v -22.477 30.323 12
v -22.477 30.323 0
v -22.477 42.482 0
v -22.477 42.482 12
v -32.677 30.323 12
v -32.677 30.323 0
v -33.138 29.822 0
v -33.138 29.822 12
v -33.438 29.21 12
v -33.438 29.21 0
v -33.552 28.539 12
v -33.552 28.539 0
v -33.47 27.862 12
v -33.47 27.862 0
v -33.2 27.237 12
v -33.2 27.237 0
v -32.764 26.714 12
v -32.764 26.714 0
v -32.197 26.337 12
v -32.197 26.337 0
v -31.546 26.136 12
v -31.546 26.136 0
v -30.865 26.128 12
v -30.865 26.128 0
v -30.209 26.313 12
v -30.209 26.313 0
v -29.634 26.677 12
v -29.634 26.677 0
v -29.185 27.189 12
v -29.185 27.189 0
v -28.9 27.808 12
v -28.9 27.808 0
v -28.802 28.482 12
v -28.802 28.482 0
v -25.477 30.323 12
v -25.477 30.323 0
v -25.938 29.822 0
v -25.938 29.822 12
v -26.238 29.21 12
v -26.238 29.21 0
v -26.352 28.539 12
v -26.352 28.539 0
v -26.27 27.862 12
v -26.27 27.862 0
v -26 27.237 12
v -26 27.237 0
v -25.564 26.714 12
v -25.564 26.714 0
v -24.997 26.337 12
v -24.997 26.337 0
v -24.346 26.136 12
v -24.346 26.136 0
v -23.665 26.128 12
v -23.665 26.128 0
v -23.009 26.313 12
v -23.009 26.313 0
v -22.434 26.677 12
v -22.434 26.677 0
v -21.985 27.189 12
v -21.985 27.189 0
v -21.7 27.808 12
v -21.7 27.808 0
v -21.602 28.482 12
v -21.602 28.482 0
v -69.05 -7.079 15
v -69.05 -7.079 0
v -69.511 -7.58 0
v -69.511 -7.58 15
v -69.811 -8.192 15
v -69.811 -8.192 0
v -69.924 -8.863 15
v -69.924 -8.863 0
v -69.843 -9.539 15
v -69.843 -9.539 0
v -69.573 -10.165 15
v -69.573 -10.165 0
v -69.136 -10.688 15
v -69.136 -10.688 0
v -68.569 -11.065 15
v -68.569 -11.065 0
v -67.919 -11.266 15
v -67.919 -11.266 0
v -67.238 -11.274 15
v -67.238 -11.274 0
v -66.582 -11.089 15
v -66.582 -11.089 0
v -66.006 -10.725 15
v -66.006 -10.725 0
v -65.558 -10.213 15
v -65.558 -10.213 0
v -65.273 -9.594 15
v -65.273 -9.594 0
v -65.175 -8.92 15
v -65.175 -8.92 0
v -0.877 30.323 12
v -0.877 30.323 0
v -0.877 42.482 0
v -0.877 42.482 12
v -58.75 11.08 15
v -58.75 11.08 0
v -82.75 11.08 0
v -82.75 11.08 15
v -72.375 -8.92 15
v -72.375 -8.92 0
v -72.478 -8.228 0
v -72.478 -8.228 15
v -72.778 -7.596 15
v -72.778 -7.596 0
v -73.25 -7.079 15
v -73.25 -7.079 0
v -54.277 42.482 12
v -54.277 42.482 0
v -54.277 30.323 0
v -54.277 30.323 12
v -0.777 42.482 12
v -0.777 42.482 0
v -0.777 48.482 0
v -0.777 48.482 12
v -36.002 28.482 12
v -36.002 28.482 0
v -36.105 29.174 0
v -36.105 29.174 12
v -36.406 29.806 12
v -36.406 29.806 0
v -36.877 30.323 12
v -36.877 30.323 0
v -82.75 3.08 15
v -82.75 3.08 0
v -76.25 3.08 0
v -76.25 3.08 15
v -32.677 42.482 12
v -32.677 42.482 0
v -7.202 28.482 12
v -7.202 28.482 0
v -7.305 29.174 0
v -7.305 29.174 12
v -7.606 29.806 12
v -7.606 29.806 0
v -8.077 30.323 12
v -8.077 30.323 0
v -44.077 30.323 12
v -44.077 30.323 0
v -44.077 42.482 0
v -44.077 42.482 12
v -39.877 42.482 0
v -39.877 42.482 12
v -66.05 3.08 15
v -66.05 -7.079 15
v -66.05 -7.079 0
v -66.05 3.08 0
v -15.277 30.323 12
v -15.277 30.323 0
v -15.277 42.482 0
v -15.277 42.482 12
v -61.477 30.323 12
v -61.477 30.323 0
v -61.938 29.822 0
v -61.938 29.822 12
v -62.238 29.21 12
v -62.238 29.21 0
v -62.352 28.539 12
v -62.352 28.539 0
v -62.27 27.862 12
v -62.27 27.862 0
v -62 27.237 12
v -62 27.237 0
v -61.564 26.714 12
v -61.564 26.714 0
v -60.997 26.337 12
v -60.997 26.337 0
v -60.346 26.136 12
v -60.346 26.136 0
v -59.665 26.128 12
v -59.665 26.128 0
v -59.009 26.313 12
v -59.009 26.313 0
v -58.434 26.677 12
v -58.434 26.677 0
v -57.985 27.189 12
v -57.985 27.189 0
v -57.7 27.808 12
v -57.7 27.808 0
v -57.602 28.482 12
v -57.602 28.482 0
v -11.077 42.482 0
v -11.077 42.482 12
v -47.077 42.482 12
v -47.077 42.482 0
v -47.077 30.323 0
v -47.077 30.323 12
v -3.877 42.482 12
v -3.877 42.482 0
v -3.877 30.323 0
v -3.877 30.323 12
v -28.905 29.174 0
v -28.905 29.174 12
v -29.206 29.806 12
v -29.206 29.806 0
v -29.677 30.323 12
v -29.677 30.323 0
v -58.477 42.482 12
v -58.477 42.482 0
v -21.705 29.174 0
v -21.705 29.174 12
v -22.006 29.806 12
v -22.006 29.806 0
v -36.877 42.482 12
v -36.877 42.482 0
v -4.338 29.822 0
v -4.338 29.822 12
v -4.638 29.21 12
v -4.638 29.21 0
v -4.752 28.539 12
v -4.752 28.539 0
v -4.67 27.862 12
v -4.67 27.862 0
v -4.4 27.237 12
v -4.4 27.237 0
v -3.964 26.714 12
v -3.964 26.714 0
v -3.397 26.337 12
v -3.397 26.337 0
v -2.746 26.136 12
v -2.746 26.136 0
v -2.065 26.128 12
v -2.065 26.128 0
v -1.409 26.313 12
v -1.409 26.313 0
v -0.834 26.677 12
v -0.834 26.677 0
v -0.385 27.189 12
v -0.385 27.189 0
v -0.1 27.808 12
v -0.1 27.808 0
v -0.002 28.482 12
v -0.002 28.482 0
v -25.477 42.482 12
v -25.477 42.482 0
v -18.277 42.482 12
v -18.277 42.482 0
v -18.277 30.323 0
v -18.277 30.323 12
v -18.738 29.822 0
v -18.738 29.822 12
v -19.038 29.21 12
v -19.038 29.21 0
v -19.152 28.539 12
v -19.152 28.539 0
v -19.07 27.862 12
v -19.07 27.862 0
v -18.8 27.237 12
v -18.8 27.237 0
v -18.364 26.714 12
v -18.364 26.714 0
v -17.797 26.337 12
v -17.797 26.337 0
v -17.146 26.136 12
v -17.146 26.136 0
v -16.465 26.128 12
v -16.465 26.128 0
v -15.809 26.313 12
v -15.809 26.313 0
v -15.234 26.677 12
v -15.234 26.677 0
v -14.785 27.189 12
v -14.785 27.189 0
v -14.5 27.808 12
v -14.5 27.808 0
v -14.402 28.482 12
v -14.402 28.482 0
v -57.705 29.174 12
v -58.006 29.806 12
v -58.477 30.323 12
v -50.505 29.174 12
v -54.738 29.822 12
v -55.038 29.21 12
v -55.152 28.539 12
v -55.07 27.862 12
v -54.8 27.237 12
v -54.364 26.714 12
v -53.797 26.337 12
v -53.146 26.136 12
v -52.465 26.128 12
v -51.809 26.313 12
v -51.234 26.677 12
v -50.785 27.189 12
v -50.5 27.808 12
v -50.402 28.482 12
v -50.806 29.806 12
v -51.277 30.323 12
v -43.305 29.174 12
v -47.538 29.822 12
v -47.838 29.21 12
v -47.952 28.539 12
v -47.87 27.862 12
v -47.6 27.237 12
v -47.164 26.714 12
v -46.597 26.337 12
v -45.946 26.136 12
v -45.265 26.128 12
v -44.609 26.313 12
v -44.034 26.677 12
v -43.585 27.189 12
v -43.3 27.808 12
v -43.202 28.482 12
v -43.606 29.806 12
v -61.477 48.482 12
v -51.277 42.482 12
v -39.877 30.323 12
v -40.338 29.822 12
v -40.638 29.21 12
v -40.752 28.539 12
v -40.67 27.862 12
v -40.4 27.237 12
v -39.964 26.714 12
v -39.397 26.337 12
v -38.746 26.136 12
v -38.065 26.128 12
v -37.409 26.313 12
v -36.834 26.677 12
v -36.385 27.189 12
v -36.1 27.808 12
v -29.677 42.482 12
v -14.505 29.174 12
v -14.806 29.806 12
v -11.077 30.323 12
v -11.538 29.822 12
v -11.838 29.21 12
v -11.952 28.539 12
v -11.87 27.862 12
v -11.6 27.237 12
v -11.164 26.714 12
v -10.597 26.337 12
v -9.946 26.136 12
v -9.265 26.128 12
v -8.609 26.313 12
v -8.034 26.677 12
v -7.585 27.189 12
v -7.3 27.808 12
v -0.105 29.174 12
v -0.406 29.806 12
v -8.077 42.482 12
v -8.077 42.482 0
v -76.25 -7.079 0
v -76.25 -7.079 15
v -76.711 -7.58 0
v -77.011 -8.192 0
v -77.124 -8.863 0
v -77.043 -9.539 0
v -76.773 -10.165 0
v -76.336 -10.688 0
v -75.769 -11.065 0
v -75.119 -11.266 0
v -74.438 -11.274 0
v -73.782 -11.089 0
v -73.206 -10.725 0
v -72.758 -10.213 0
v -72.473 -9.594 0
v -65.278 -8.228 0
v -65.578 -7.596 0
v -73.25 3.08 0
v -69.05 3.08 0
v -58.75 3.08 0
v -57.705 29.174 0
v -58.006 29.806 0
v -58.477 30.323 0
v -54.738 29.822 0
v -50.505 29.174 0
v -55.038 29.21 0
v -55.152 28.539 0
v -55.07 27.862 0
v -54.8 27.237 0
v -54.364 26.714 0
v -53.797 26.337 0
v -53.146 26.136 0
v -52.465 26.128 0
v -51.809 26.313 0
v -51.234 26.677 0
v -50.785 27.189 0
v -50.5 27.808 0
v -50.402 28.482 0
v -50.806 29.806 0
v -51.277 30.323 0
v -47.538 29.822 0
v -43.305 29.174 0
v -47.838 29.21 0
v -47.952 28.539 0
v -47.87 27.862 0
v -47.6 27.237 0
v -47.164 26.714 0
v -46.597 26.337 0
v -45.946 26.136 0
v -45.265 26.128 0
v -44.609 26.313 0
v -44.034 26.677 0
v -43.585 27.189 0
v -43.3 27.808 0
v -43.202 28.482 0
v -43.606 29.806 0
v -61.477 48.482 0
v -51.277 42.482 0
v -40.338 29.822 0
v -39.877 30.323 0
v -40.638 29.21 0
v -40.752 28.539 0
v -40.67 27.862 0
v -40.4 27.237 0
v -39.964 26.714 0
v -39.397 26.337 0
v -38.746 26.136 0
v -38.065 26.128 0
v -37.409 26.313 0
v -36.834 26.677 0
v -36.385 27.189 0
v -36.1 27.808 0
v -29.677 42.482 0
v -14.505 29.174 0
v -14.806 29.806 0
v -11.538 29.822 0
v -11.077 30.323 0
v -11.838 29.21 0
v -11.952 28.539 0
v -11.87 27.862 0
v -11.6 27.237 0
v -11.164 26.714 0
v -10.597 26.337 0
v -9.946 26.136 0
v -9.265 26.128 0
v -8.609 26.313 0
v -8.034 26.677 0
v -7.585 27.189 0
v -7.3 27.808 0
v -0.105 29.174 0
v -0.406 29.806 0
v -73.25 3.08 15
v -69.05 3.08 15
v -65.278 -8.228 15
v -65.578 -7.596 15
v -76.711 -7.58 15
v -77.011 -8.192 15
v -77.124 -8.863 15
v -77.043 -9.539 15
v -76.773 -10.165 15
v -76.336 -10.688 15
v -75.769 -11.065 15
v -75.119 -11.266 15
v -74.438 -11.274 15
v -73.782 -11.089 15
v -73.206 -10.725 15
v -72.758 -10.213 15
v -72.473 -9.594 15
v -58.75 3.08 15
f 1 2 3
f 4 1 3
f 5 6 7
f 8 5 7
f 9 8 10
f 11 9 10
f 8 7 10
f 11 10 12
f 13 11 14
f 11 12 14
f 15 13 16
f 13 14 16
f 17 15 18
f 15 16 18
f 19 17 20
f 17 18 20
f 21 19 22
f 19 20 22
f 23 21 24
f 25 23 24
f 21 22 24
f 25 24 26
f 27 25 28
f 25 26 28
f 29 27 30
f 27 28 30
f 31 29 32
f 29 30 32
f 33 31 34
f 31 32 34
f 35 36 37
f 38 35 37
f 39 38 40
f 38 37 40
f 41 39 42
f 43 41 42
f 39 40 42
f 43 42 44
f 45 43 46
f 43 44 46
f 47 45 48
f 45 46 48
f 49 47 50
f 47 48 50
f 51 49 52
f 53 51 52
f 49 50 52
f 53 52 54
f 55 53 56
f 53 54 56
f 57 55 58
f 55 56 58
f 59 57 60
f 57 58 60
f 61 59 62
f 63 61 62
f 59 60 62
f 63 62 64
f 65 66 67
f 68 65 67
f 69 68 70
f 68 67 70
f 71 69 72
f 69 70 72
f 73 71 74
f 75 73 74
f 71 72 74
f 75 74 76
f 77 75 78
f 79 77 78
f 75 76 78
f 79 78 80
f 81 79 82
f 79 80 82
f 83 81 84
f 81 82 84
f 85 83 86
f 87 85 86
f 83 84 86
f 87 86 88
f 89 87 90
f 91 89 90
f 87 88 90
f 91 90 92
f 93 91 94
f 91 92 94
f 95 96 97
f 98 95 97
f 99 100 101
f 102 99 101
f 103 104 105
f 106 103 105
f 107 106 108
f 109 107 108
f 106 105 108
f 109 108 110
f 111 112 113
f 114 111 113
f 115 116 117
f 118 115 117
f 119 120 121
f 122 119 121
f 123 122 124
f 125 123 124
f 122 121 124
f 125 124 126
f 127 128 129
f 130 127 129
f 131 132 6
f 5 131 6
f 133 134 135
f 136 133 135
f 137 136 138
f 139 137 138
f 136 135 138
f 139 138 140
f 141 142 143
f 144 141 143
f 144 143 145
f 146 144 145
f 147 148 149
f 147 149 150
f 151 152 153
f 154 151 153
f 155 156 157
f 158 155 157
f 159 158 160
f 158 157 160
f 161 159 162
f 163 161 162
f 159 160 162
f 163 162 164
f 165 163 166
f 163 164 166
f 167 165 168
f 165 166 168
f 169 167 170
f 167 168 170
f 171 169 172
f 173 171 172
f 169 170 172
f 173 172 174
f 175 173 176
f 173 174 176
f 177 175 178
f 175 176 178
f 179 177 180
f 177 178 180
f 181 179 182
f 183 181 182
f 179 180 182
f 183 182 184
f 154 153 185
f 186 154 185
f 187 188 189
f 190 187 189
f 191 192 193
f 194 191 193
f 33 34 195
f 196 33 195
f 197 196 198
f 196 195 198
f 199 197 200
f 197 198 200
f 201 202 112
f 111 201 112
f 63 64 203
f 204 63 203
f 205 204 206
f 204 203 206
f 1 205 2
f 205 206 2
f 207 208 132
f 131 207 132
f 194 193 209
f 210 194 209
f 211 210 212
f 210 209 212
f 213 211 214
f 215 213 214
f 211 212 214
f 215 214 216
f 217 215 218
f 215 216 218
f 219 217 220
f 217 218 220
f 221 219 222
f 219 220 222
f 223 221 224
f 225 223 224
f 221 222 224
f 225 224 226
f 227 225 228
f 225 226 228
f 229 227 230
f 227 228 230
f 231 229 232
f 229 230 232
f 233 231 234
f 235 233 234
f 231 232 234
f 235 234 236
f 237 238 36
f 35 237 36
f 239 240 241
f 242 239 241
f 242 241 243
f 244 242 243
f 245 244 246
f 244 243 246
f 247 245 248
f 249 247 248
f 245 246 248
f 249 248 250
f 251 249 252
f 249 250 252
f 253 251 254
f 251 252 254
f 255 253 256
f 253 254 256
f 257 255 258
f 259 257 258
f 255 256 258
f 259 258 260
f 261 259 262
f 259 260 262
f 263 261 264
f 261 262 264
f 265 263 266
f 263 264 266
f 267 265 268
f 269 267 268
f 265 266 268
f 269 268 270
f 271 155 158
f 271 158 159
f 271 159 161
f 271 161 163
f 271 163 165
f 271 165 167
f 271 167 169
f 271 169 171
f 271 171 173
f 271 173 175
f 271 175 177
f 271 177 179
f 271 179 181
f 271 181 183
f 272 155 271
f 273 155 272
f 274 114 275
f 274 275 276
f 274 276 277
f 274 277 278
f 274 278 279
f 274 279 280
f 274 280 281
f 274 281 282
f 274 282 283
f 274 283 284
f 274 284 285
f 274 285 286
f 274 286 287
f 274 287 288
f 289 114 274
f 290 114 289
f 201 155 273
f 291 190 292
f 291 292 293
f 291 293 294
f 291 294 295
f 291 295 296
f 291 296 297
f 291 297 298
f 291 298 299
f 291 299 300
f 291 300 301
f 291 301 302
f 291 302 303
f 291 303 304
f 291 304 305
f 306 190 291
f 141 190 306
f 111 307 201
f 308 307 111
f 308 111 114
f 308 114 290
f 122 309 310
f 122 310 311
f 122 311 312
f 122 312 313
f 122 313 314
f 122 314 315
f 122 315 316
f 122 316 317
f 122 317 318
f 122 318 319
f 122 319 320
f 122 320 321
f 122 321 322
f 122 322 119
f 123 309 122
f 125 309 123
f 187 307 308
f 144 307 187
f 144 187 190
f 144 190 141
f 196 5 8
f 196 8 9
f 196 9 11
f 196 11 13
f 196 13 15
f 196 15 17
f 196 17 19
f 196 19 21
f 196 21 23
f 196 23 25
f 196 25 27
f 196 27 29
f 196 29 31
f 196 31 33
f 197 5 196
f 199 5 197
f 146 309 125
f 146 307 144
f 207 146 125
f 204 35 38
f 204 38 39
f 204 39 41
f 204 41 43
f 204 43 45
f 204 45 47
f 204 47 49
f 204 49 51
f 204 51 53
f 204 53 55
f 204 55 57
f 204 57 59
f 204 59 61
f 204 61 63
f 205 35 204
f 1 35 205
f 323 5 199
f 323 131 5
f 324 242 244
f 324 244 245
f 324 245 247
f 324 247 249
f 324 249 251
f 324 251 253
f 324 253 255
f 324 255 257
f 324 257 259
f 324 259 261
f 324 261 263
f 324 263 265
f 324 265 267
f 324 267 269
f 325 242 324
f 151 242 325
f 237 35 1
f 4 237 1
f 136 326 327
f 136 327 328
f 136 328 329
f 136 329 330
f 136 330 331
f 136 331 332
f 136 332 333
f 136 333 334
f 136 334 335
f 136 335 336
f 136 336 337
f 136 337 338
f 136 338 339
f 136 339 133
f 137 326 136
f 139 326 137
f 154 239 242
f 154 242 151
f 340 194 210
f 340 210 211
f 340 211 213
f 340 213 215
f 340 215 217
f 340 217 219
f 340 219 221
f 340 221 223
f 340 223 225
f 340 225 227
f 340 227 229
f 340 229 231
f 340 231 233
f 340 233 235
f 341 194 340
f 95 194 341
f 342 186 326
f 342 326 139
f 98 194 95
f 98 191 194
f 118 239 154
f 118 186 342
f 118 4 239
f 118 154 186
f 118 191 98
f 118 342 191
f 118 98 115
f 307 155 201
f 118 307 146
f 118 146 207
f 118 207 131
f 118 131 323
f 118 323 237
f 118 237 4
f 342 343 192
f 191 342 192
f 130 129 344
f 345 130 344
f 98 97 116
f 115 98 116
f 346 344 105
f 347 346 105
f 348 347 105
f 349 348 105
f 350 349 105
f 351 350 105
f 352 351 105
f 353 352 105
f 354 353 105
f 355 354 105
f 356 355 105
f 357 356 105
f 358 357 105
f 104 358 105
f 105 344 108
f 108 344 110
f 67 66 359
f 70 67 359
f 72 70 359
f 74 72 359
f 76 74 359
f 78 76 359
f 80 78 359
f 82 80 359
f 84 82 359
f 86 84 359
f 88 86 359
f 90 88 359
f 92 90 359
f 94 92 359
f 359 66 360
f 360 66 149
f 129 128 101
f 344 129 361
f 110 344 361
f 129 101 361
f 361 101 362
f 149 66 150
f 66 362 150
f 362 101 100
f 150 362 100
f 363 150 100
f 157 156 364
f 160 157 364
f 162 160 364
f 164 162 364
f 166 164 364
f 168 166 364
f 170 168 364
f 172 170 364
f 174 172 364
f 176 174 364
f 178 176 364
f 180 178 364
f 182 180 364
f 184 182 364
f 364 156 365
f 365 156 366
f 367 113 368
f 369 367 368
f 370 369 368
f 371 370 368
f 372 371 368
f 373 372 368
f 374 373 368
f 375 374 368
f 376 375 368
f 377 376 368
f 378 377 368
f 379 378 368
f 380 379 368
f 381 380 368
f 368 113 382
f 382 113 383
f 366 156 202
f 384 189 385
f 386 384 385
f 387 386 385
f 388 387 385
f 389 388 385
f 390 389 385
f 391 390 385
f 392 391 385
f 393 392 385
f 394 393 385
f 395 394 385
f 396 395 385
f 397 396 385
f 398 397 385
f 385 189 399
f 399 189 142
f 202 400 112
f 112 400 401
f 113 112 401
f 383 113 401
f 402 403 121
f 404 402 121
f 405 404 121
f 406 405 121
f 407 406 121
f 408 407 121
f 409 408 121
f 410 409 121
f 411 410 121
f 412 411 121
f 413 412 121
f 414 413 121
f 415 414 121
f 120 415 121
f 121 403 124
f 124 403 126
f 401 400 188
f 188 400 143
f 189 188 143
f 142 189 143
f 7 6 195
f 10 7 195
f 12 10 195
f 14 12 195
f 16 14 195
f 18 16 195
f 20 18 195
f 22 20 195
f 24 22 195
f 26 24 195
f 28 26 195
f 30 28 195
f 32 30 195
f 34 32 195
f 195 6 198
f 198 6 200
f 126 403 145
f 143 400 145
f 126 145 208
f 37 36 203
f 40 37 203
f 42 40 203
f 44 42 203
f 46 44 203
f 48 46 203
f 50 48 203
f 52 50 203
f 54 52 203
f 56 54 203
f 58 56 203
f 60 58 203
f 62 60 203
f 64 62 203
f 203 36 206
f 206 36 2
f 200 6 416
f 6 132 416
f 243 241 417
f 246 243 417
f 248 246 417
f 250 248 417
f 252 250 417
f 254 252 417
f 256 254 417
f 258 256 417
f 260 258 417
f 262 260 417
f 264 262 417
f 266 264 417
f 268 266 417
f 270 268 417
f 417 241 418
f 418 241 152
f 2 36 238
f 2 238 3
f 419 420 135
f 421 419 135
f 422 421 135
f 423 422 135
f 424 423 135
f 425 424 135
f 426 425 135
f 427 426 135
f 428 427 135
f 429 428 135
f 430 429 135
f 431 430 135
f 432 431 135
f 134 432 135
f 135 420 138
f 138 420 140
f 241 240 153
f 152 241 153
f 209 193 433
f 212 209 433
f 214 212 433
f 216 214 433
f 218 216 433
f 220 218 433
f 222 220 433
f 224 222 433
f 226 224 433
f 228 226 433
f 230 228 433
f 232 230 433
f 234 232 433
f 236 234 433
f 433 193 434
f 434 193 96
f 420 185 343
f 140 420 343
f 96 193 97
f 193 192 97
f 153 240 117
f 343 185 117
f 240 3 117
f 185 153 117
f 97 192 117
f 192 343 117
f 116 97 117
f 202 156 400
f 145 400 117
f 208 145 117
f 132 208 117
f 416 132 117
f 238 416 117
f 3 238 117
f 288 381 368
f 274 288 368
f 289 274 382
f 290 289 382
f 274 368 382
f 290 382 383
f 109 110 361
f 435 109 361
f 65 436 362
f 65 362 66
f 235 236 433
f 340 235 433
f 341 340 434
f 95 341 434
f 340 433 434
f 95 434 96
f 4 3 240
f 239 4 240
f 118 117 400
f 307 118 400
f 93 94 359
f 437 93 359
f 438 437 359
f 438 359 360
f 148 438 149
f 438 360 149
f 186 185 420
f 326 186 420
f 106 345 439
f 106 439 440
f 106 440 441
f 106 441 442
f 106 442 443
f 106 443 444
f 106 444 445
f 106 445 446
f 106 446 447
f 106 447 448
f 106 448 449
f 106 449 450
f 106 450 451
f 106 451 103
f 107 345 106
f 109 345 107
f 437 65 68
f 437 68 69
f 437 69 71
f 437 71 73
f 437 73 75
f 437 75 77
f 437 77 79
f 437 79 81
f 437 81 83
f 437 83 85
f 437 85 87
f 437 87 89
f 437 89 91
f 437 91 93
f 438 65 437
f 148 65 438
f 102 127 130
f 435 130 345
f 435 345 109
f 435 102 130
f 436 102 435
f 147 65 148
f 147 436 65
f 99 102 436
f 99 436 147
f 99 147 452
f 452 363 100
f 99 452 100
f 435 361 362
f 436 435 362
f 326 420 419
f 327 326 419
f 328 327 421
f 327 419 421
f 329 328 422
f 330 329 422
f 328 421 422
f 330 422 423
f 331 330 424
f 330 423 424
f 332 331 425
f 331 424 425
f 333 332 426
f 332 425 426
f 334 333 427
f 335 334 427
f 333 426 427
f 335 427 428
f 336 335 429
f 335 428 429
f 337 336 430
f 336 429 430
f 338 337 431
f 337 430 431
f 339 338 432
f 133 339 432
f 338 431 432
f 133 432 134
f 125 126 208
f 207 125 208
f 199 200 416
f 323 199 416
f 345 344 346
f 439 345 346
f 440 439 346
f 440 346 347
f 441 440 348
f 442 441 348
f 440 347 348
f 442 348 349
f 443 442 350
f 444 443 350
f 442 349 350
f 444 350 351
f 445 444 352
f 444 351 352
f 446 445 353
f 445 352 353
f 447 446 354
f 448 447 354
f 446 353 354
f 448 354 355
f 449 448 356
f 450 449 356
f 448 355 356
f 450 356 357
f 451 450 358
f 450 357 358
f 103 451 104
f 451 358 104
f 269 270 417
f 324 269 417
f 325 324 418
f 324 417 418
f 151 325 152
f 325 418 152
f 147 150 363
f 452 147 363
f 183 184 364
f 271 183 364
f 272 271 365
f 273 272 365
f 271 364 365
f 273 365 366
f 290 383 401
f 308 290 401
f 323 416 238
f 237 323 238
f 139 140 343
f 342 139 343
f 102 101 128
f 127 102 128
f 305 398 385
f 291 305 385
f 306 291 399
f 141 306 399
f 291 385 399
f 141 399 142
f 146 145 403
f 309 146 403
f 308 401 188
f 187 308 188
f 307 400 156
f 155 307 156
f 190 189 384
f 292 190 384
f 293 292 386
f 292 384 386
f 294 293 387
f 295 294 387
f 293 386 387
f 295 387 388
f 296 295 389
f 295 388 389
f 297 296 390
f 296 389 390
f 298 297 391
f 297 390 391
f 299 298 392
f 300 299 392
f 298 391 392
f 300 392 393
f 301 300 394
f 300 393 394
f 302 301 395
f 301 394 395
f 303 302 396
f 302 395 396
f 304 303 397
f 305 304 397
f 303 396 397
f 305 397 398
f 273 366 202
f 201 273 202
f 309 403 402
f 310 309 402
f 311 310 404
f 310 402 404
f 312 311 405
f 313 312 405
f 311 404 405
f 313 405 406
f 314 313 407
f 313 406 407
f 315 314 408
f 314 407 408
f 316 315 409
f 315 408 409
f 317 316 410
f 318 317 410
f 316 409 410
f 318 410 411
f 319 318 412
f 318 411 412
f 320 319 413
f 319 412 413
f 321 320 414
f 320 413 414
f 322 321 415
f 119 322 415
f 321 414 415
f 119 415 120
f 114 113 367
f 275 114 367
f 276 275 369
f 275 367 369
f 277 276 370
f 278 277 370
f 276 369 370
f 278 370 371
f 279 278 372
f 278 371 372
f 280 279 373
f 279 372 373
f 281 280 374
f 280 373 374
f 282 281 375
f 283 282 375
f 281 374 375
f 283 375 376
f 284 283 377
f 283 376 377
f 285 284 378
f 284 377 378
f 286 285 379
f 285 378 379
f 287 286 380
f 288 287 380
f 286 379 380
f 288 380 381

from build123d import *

# Parameters (mm, degrees)
F0_W     = 3
F0_H     = 6
F0_W_2   = 4.2
F0_W_3   = 0.1
F1_DEPTH = 12
F2_W     = 3
F2_H     = 6
F2_W_2   = 2.5
F2_W_3   = 1.7
F2_W_4   = 0.8
F3_DEPTH = 15


with BuildPart() as f1:
    # F0 (on Top) → F1 (new body)
    with BuildSketch(Plane.XY):
        with Locations((-59.9772681922, 45.4818769696)):
            Rectangle(F0_W, F0_H)
        with Locations((-56.3772681922, 45.4818769696)):
            Rectangle(F0_W_2, F0_H)
        with BuildLine():
            Line((-58.4772681922, 42.4818769696), (-61.4772681922, 42.4818769696))
            Line((-61.4772681922, 42.4818769696), (-61.4772681922, 30.3232419525))
            ThreePointArc((-61.4772681922, 30.3232419525), (-59.9772681922, 30.8568769696), (-58.4772681922, 30.3232419525))
            Line((-58.4772681922, 30.3232419525), (-58.4772681922, 42.4818769696))
        make_face()
        with Locations((-52.7772681922, 45.4818769696)):
            Rectangle(F0_W, F0_H)
        with BuildLine():
            ThreePointArc((-58.4772681922, 30.3232419525), (-59.9772681922, 30.8568769696), (-61.4772681922, 30.3232419525))
            Line((-61.4772681922, 30.3232419525), (-61.4772681922, 28.4818769696))
            Line((-61.4772681922, 28.4818769696), (-58.4772681922, 28.4818769696))
            Line((-58.4772681922, 28.4818769696), (-58.4772681922, 30.3232419525))
        make_face()
        with BuildLine():
            Line((-61.4772681922, 28.4818769696), (-61.4772681922, 30.3232419525))
            ThreePointArc((-61.4772681922, 30.3232419525), (-60.9966123441, 26.3367516819), (-57.6022681922, 28.4818769696))
            ThreePointArc((-57.6022681922, 28.4818769696), (-57.8321429045, 29.5012211215), (-58.4772681922, 30.3232419525))
            Line((-58.4772681922, 30.3232419525), (-58.4772681922, 28.4818769696))
            Line((-58.4772681922, 28.4818769696), (-61.4772681922, 28.4818769696))
        make_face()
        with Locations((-49.1772681922, 45.4818769696)):
            Rectangle(F0_W_2, F0_H)
        with BuildLine():
            Line((-51.2772681922, 42.4818769696), (-54.2772681922, 42.4818769696))
            Line((-54.2772681922, 42.4818769696), (-54.2772681922, 30.3232419525))
            ThreePointArc((-54.2772681922, 30.3232419525), (-52.7772681922, 30.8568769696), (-51.2772681922, 30.3232419525))
            Line((-51.2772681922, 30.3232419525), (-51.2772681922, 42.4818769696))
        make_face()
        with Locations((-45.5772681922, 45.4818769696)):
            Rectangle(F0_W, F0_H)
        with BuildLine():
            ThreePointArc((-51.2772681922, 30.3232419525), (-52.7772681922, 30.8568769696), (-54.2772681922, 30.3232419525))
            Line((-54.2772681922, 30.3232419525), (-54.2772681922, 28.4818769696))
            Line((-54.2772681922, 28.4818769696), (-51.2772681922, 28.4818769696))
            Line((-51.2772681922, 28.4818769696), (-51.2772681922, 30.3232419525))
        make_face()
        with BuildLine():
            Line((-54.2772681922, 28.4818769696), (-54.2772681922, 30.3232419525))
            ThreePointArc((-54.2772681922, 30.3232419525), (-53.7966123441, 26.3367516819), (-50.4022681922, 28.4818769696))
            ThreePointArc((-50.4022681922, 28.4818769696), (-50.6321429045, 29.5012211215), (-51.2772681922, 30.3232419525))
            Line((-51.2772681922, 30.3232419525), (-51.2772681922, 28.4818769696))
            Line((-51.2772681922, 28.4818769696), (-54.2772681922, 28.4818769696))
        make_face()
        with Locations((-41.9772681922, 45.4818769696)):
            Rectangle(F0_W_2, F0_H)
        with BuildLine():
            Line((-44.0772681922, 42.4818769696), (-47.0772681922, 42.4818769696))
            Line((-47.0772681922, 42.4818769696), (-47.0772681922, 30.3232419525))
            ThreePointArc((-47.0772681922, 30.3232419525), (-45.5772681922, 30.8568769696), (-44.0772681922, 30.3232419525))
            Line((-44.0772681922, 30.3232419525), (-44.0772681922, 42.4818769696))
        make_face()
        with Locations((-38.3772681922, 45.4818769696)):
            Rectangle(F0_W, F0_H)
        with BuildLine():
            ThreePointArc((-44.0772681922, 30.3232419525), (-45.5772681922, 30.8568769696), (-47.0772681922, 30.3232419525))
            Line((-47.0772681922, 30.3232419525), (-47.0772681922, 28.4818769696))
            Line((-47.0772681922, 28.4818769696), (-44.0772681922, 28.4818769696))
            Line((-44.0772681922, 28.4818769696), (-44.0772681922, 30.3232419525))
        make_face()
        with BuildLine():
            Line((-47.0772681922, 28.4818769696), (-47.0772681922, 30.3232419525))
            ThreePointArc((-47.0772681922, 30.3232419525), (-46.5966123441, 26.3367516819), (-43.2022681922, 28.4818769696))
            ThreePointArc((-43.2022681922, 28.4818769696), (-43.4321429045, 29.5012211215), (-44.0772681922, 30.3232419525))
            Line((-44.0772681922, 30.3232419525), (-44.0772681922, 28.4818769696))
            Line((-44.0772681922, 28.4818769696), (-47.0772681922, 28.4818769696))
        make_face()
        with Locations((-34.7772681922, 45.4818769696)):
            Rectangle(F0_W_2, F0_H)
        with BuildLine():
            Line((-36.8772681922, 42.4818769696), (-39.8772681922, 42.4818769696))
            Line((-39.8772681922, 42.4818769696), (-39.8772681922, 30.3232419525))
            ThreePointArc((-39.8772681922, 30.3232419525), (-38.3772681922, 30.8568769696), (-36.8772681922, 30.3232419525))
            Line((-36.8772681922, 30.3232419525), (-36.8772681922, 42.4818769696))
        make_face()
        with Locations((-31.1772681922, 45.4818769696)):
            Rectangle(F0_W, F0_H)
        with BuildLine():
            ThreePointArc((-36.8772681922, 30.3232419525), (-38.3772681922, 30.8568769696), (-39.8772681922, 30.3232419525))
            Line((-39.8772681922, 30.3232419525), (-39.8772681922, 28.4818769696))
            Line((-39.8772681922, 28.4818769696), (-36.8772681922, 28.4818769696))
            Line((-36.8772681922, 28.4818769696), (-36.8772681922, 30.3232419525))
        make_face()
        with BuildLine():
            Line((-39.8772681922, 28.4818769696), (-39.8772681922, 30.3232419525))
            ThreePointArc((-39.8772681922, 30.3232419525), (-39.3966123441, 26.3367516819), (-36.0022681922, 28.4818769696))
            ThreePointArc((-36.0022681922, 28.4818769696), (-36.2321429045, 29.5012211215), (-36.8772681922, 30.3232419525))
            Line((-36.8772681922, 30.3232419525), (-36.8772681922, 28.4818769696))
            Line((-36.8772681922, 28.4818769696), (-39.8772681922, 28.4818769696))
        make_face()
        with Locations((-27.5772681922, 45.4818769696)):
            Rectangle(F0_W_2, F0_H)
        with BuildLine():
            Line((-29.6772681922, 42.4818769696), (-32.6772681922, 42.4818769696))
            Line((-32.6772681922, 42.4818769696), (-32.6772681922, 30.3232419525))
            ThreePointArc((-32.6772681922, 30.3232419525), (-31.1772681922, 30.8568769696), (-29.6772681922, 30.3232419525))
            Line((-29.6772681922, 30.3232419525), (-29.6772681922, 42.4818769696))
        make_face()
        with Locations((-23.9772681922, 45.4818769696)):
            Rectangle(F0_W, F0_H)
        with BuildLine():
            ThreePointArc((-29.6772681922, 30.3232419525), (-31.1772681922, 30.8568769696), (-32.6772681922, 30.3232419525))
            Line((-32.6772681922, 30.3232419525), (-32.6772681922, 28.4818769696))
            Line((-32.6772681922, 28.4818769696), (-29.6772681922, 28.4818769696))
            Line((-29.6772681922, 28.4818769696), (-29.6772681922, 30.3232419525))
        make_face()
        with BuildLine():
            Line((-32.6772681922, 28.4818769696), (-32.6772681922, 30.3232419525))
            ThreePointArc((-32.6772681922, 30.3232419525), (-32.1966123441, 26.3367516819), (-28.8022681922, 28.4818769696))
            ThreePointArc((-28.8022681922, 28.4818769696), (-29.0321429045, 29.5012211215), (-29.6772681922, 30.3232419525))
            Line((-29.6772681922, 30.3232419525), (-29.6772681922, 28.4818769696))
            Line((-29.6772681922, 28.4818769696), (-32.6772681922, 28.4818769696))
        make_face()
        with Locations((-20.3772681922, 45.4818769696)):
            Rectangle(F0_W_2, F0_H)
        with BuildLine():
            Line((-22.4772681922, 42.4818769696), (-25.4772681922, 42.4818769696))
            Line((-25.4772681922, 42.4818769696), (-25.4772681922, 30.3232419525))
            ThreePointArc((-25.4772681922, 30.3232419525), (-23.9772681922, 30.8568769696), (-22.4772681922, 30.3232419525))
            Line((-22.4772681922, 30.3232419525), (-22.4772681922, 42.4818769696))
        make_face()
        with Locations((-16.7772681922, 45.4818769696)):
            Rectangle(F0_W, F0_H)
        with BuildLine():
            ThreePointArc((-22.4772681922, 30.3232419525), (-23.9772681922, 30.8568769696), (-25.4772681922, 30.3232419525))
            Line((-25.4772681922, 30.3232419525), (-25.4772681922, 28.4818769696))
            Line((-25.4772681922, 28.4818769696), (-22.4772681922, 28.4818769696))
            Line((-22.4772681922, 28.4818769696), (-22.4772681922, 30.3232419525))
        make_face()
        with BuildLine():
            Line((-25.4772681922, 28.4818769696), (-25.4772681922, 30.3232419525))
            ThreePointArc((-25.4772681922, 30.3232419525), (-24.9966123441, 26.3367516819), (-21.6022681922, 28.4818769696))
            ThreePointArc((-21.6022681922, 28.4818769696), (-21.8321429045, 29.5012211215), (-22.4772681922, 30.3232419525))
            Line((-22.4772681922, 30.3232419525), (-22.4772681922, 28.4818769696))
            Line((-22.4772681922, 28.4818769696), (-25.4772681922, 28.4818769696))
        make_face()
        with Locations((-13.1772681922, 45.4818769696)):
            Rectangle(F0_W_2, F0_H)
        with BuildLine():
            Line((-15.2772681922, 42.4818769696), (-18.2772681922, 42.4818769696))
            Line((-18.2772681922, 42.4818769696), (-18.2772681922, 30.3232419525))
            ThreePointArc((-18.2772681922, 30.3232419525), (-16.7772681922, 30.8568769696), (-15.2772681922, 30.3232419525))
            Line((-15.2772681922, 30.3232419525), (-15.2772681922, 42.4818769696))
        make_face()
        with Locations((-9.5772681922, 45.4818769696)):
            Rectangle(F0_W, F0_H)
        with BuildLine():
            ThreePointArc((-15.2772681922, 30.3232419525), (-16.7772681922, 30.8568769696), (-18.2772681922, 30.3232419525))
            Line((-18.2772681922, 30.3232419525), (-18.2772681922, 28.4818769696))
            Line((-18.2772681922, 28.4818769696), (-15.2772681922, 28.4818769696))
            Line((-15.2772681922, 28.4818769696), (-15.2772681922, 30.3232419525))
        make_face()
        with BuildLine():
            Line((-18.2772681922, 28.4818769696), (-18.2772681922, 30.3232419525))
            ThreePointArc((-18.2772681922, 30.3232419525), (-17.7966123441, 26.3367516819), (-14.4022681922, 28.4818769696))
            ThreePointArc((-14.4022681922, 28.4818769696), (-14.6321429045, 29.5012211215), (-15.2772681922, 30.3232419525))
            Line((-15.2772681922, 30.3232419525), (-15.2772681922, 28.4818769696))
            Line((-15.2772681922, 28.4818769696), (-18.2772681922, 28.4818769696))
        make_face()
        with Locations((-5.9772681922, 45.4818769696)):
            Rectangle(F0_W_2, F0_H)
        with BuildLine():
            Line((-8.0772681922, 42.4818769696), (-11.0772681922, 42.4818769696))
            Line((-11.0772681922, 42.4818769696), (-11.0772681922, 30.3232419525))
            ThreePointArc((-11.0772681922, 30.3232419525), (-9.5772681922, 30.8568769696), (-8.0772681922, 30.3232419525))
            Line((-8.0772681922, 30.3232419525), (-8.0772681922, 42.4818769696))
        make_face()
        with Locations((-2.3772681922, 45.4818769696)):
            Rectangle(F0_W, F0_H)
        with BuildLine():
            ThreePointArc((-8.0772681922, 30.3232419525), (-9.5772681922, 30.8568769696), (-11.0772681922, 30.3232419525))
            Line((-11.0772681922, 30.3232419525), (-11.0772681922, 28.4818769696))
            Line((-11.0772681922, 28.4818769696), (-8.0772681922, 28.4818769696))
            Line((-8.0772681922, 28.4818769696), (-8.0772681922, 30.3232419525))
        make_face()
        with BuildLine():
            Line((-11.0772681922, 28.4818769696), (-11.0772681922, 30.3232419525))
            ThreePointArc((-11.0772681922, 30.3232419525), (-10.5966123441, 26.3367516819), (-7.2022681922, 28.4818769696))
            ThreePointArc((-7.2022681922, 28.4818769696), (-7.4321429045, 29.5012211215), (-8.0772681922, 30.3232419525))
            Line((-8.0772681922, 30.3232419525), (-8.0772681922, 28.4818769696))
            Line((-8.0772681922, 28.4818769696), (-11.0772681922, 28.4818769696))
        make_face()
        with Locations((-0.8272681922, 45.4818769696)):
            Rectangle(F0_W_3, F0_H)
        with BuildLine():
            Line((-0.8772681922, 42.4818769696), (-3.8772681922, 42.4818769696))
            Line((-3.8772681922, 42.4818769696), (-3.8772681922, 30.3232419525))
            ThreePointArc((-3.8772681922, 30.3232419525), (-2.3772681922, 30.8568769696), (-0.8772681922, 30.3232419525))
            Line((-0.8772681922, 30.3232419525), (-0.8772681922, 42.4818769696))
        make_face()
        with BuildLine():
            ThreePointArc((-0.8772681922, 30.3232419525), (-2.3772681922, 30.8568769696), (-3.8772681922, 30.3232419525))
            Line((-3.8772681922, 30.3232419525), (-3.8772681922, 28.4818769696))
            Line((-3.8772681922, 28.4818769696), (-0.8772681922, 28.4818769696))
            Line((-0.8772681922, 28.4818769696), (-0.8772681922, 30.3232419525))
        make_face()
        with BuildLine():
            Line((-3.8772681922, 28.4818769696), (-3.8772681922, 30.3232419525))
            ThreePointArc((-3.8772681922, 30.3232419525), (-3.3966123441, 26.3367516819), (-0.0022681922, 28.4818769696))
            ThreePointArc((-0.0022681922, 28.4818769696), (-0.2321429045, 29.5012211215), (-0.8772681922, 30.3232419525))
            Line((-0.8772681922, 30.3232419525), (-0.8772681922, 28.4818769696))
            Line((-0.8772681922, 28.4818769696), (-3.8772681922, 28.4818769696))
        make_face()
    extrude(amount=F1_DEPTH)


with BuildPart() as f3:
    # F2 (on Top) → F3 (new body)
    with BuildSketch(Plane.XY):
        Polygon((-76.2500009537, 3.0799796343), (-76.2500009537, 9.0799796343), (-73.2500009537, 9.0799796343), (-70.7500009537, 9.0799796343), (-70.7500009537, 11.0799796343), (-82.7500009537, 11.0799796343), (-82.7500009537, 3.0799796343), align=None)
        with Locations((-74.7500009537, 6.0799796343)):
            Rectangle(F2_W, F2_H)
        with Locations((-72.0000009537, 6.0799796343)):
            Rectangle(F2_W_2, F2_H)
        with BuildLine():
            Line((-73.2500009537, 3.0799796343), (-76.2500009537, 3.0799796343))
            Line((-76.2500009537, 3.0799796343), (-76.2500009537, -7.0786553828))
            ThreePointArc((-76.2500009537, -7.0786553828), (-74.7500009537, -6.5450203657), (-73.2500009537, -7.0786553828))
            Line((-73.2500009537, -7.0786553828), (-73.2500009537, 3.0799796343))
        make_face()
        Polygon((-70.7500009537, 11.0799796343), (-70.7500009537, 9.0799796343), (-69.0500009537, 9.0799796343), (-66.0500009537, 9.0799796343), (-65.2500009537, 9.0799796343), (-65.2500009537, 3.0799796343), (-58.7500009537, 3.0799796343), (-58.7500009537, 11.0799796343), align=None)
        with Locations((-69.9000009537, 6.0799796343)):
            Rectangle(F2_W_3, F2_H)
        with BuildLine():
            ThreePointArc((-73.2500009537, -7.0786553828), (-74.7500009537, -6.5450203657), (-76.2500009537, -7.0786553828))
            Line((-76.2500009537, -7.0786553828), (-76.2500009537, -8.9200203657))
            Line((-76.2500009537, -8.9200203657), (-73.2500009537, -8.9200203657))
            Line((-73.2500009537, -8.9200203657), (-73.2500009537, -7.0786553828))
        make_face()
        with BuildLine():
            Line((-76.2500009537, -8.9200203657), (-76.2500009537, -7.0786553828))
            ThreePointArc((-76.2500009537, -7.0786553828), (-75.7693451056, -11.0651456534), (-72.3750009537, -8.9200203657))
            ThreePointArc((-72.3750009537, -8.9200203657), (-72.604875666, -7.9006762138), (-73.2500009537, -7.0786553828))
            Line((-73.2500009537, -7.0786553828), (-73.2500009537, -8.9200203657))
            Line((-73.2500009537, -8.9200203657), (-76.2500009537, -8.9200203657))
        make_face()
        with Locations((-67.5500009537, 6.0799796343)):
            Rectangle(F2_W, F2_H)
        with Locations((-65.6500009537, 6.0799796343)):
            Rectangle(F2_W_4, F2_H)
        with BuildLine():
            Line((-66.0500009537, 3.0799796343), (-69.0500009537, 3.0799796343))
            Line((-69.0500009537, 3.0799796343), (-69.0500009537, -7.0786553828))
            ThreePointArc((-69.0500009537, -7.0786553828), (-67.5500009537, -6.5450203657), (-66.0500009537, -7.0786553828))
            Line((-66.0500009537, -7.0786553828), (-66.0500009537, 3.0799796343))
        make_face()
        with BuildLine():
            ThreePointArc((-66.0500009537, -7.0786553828), (-67.5500009537, -6.5450203657), (-69.0500009537, -7.0786553828))
            Line((-69.0500009537, -7.0786553828), (-69.0500009537, -8.9200203657))
            Line((-69.0500009537, -8.9200203657), (-66.0500009537, -8.9200203657))
            Line((-66.0500009537, -8.9200203657), (-66.0500009537, -7.0786553828))
        make_face()
        with BuildLine():
            Line((-69.0500009537, -8.9200203657), (-69.0500009537, -7.0786553828))
            ThreePointArc((-69.0500009537, -7.0786553828), (-68.5693451056, -11.0651456534), (-65.1750009537, -8.9200203657))
            ThreePointArc((-65.1750009537, -8.9200203657), (-65.404875666, -7.9006762138), (-66.0500009537, -7.0786553828))
            Line((-66.0500009537, -7.0786553828), (-66.0500009537, -8.9200203657))
            Line((-66.0500009537, -8.9200203657), (-69.0500009537, -8.9200203657))
        make_face()
    extrude(amount=F3_DEPTH)


solid = Compound([f1.part, f3.part])
